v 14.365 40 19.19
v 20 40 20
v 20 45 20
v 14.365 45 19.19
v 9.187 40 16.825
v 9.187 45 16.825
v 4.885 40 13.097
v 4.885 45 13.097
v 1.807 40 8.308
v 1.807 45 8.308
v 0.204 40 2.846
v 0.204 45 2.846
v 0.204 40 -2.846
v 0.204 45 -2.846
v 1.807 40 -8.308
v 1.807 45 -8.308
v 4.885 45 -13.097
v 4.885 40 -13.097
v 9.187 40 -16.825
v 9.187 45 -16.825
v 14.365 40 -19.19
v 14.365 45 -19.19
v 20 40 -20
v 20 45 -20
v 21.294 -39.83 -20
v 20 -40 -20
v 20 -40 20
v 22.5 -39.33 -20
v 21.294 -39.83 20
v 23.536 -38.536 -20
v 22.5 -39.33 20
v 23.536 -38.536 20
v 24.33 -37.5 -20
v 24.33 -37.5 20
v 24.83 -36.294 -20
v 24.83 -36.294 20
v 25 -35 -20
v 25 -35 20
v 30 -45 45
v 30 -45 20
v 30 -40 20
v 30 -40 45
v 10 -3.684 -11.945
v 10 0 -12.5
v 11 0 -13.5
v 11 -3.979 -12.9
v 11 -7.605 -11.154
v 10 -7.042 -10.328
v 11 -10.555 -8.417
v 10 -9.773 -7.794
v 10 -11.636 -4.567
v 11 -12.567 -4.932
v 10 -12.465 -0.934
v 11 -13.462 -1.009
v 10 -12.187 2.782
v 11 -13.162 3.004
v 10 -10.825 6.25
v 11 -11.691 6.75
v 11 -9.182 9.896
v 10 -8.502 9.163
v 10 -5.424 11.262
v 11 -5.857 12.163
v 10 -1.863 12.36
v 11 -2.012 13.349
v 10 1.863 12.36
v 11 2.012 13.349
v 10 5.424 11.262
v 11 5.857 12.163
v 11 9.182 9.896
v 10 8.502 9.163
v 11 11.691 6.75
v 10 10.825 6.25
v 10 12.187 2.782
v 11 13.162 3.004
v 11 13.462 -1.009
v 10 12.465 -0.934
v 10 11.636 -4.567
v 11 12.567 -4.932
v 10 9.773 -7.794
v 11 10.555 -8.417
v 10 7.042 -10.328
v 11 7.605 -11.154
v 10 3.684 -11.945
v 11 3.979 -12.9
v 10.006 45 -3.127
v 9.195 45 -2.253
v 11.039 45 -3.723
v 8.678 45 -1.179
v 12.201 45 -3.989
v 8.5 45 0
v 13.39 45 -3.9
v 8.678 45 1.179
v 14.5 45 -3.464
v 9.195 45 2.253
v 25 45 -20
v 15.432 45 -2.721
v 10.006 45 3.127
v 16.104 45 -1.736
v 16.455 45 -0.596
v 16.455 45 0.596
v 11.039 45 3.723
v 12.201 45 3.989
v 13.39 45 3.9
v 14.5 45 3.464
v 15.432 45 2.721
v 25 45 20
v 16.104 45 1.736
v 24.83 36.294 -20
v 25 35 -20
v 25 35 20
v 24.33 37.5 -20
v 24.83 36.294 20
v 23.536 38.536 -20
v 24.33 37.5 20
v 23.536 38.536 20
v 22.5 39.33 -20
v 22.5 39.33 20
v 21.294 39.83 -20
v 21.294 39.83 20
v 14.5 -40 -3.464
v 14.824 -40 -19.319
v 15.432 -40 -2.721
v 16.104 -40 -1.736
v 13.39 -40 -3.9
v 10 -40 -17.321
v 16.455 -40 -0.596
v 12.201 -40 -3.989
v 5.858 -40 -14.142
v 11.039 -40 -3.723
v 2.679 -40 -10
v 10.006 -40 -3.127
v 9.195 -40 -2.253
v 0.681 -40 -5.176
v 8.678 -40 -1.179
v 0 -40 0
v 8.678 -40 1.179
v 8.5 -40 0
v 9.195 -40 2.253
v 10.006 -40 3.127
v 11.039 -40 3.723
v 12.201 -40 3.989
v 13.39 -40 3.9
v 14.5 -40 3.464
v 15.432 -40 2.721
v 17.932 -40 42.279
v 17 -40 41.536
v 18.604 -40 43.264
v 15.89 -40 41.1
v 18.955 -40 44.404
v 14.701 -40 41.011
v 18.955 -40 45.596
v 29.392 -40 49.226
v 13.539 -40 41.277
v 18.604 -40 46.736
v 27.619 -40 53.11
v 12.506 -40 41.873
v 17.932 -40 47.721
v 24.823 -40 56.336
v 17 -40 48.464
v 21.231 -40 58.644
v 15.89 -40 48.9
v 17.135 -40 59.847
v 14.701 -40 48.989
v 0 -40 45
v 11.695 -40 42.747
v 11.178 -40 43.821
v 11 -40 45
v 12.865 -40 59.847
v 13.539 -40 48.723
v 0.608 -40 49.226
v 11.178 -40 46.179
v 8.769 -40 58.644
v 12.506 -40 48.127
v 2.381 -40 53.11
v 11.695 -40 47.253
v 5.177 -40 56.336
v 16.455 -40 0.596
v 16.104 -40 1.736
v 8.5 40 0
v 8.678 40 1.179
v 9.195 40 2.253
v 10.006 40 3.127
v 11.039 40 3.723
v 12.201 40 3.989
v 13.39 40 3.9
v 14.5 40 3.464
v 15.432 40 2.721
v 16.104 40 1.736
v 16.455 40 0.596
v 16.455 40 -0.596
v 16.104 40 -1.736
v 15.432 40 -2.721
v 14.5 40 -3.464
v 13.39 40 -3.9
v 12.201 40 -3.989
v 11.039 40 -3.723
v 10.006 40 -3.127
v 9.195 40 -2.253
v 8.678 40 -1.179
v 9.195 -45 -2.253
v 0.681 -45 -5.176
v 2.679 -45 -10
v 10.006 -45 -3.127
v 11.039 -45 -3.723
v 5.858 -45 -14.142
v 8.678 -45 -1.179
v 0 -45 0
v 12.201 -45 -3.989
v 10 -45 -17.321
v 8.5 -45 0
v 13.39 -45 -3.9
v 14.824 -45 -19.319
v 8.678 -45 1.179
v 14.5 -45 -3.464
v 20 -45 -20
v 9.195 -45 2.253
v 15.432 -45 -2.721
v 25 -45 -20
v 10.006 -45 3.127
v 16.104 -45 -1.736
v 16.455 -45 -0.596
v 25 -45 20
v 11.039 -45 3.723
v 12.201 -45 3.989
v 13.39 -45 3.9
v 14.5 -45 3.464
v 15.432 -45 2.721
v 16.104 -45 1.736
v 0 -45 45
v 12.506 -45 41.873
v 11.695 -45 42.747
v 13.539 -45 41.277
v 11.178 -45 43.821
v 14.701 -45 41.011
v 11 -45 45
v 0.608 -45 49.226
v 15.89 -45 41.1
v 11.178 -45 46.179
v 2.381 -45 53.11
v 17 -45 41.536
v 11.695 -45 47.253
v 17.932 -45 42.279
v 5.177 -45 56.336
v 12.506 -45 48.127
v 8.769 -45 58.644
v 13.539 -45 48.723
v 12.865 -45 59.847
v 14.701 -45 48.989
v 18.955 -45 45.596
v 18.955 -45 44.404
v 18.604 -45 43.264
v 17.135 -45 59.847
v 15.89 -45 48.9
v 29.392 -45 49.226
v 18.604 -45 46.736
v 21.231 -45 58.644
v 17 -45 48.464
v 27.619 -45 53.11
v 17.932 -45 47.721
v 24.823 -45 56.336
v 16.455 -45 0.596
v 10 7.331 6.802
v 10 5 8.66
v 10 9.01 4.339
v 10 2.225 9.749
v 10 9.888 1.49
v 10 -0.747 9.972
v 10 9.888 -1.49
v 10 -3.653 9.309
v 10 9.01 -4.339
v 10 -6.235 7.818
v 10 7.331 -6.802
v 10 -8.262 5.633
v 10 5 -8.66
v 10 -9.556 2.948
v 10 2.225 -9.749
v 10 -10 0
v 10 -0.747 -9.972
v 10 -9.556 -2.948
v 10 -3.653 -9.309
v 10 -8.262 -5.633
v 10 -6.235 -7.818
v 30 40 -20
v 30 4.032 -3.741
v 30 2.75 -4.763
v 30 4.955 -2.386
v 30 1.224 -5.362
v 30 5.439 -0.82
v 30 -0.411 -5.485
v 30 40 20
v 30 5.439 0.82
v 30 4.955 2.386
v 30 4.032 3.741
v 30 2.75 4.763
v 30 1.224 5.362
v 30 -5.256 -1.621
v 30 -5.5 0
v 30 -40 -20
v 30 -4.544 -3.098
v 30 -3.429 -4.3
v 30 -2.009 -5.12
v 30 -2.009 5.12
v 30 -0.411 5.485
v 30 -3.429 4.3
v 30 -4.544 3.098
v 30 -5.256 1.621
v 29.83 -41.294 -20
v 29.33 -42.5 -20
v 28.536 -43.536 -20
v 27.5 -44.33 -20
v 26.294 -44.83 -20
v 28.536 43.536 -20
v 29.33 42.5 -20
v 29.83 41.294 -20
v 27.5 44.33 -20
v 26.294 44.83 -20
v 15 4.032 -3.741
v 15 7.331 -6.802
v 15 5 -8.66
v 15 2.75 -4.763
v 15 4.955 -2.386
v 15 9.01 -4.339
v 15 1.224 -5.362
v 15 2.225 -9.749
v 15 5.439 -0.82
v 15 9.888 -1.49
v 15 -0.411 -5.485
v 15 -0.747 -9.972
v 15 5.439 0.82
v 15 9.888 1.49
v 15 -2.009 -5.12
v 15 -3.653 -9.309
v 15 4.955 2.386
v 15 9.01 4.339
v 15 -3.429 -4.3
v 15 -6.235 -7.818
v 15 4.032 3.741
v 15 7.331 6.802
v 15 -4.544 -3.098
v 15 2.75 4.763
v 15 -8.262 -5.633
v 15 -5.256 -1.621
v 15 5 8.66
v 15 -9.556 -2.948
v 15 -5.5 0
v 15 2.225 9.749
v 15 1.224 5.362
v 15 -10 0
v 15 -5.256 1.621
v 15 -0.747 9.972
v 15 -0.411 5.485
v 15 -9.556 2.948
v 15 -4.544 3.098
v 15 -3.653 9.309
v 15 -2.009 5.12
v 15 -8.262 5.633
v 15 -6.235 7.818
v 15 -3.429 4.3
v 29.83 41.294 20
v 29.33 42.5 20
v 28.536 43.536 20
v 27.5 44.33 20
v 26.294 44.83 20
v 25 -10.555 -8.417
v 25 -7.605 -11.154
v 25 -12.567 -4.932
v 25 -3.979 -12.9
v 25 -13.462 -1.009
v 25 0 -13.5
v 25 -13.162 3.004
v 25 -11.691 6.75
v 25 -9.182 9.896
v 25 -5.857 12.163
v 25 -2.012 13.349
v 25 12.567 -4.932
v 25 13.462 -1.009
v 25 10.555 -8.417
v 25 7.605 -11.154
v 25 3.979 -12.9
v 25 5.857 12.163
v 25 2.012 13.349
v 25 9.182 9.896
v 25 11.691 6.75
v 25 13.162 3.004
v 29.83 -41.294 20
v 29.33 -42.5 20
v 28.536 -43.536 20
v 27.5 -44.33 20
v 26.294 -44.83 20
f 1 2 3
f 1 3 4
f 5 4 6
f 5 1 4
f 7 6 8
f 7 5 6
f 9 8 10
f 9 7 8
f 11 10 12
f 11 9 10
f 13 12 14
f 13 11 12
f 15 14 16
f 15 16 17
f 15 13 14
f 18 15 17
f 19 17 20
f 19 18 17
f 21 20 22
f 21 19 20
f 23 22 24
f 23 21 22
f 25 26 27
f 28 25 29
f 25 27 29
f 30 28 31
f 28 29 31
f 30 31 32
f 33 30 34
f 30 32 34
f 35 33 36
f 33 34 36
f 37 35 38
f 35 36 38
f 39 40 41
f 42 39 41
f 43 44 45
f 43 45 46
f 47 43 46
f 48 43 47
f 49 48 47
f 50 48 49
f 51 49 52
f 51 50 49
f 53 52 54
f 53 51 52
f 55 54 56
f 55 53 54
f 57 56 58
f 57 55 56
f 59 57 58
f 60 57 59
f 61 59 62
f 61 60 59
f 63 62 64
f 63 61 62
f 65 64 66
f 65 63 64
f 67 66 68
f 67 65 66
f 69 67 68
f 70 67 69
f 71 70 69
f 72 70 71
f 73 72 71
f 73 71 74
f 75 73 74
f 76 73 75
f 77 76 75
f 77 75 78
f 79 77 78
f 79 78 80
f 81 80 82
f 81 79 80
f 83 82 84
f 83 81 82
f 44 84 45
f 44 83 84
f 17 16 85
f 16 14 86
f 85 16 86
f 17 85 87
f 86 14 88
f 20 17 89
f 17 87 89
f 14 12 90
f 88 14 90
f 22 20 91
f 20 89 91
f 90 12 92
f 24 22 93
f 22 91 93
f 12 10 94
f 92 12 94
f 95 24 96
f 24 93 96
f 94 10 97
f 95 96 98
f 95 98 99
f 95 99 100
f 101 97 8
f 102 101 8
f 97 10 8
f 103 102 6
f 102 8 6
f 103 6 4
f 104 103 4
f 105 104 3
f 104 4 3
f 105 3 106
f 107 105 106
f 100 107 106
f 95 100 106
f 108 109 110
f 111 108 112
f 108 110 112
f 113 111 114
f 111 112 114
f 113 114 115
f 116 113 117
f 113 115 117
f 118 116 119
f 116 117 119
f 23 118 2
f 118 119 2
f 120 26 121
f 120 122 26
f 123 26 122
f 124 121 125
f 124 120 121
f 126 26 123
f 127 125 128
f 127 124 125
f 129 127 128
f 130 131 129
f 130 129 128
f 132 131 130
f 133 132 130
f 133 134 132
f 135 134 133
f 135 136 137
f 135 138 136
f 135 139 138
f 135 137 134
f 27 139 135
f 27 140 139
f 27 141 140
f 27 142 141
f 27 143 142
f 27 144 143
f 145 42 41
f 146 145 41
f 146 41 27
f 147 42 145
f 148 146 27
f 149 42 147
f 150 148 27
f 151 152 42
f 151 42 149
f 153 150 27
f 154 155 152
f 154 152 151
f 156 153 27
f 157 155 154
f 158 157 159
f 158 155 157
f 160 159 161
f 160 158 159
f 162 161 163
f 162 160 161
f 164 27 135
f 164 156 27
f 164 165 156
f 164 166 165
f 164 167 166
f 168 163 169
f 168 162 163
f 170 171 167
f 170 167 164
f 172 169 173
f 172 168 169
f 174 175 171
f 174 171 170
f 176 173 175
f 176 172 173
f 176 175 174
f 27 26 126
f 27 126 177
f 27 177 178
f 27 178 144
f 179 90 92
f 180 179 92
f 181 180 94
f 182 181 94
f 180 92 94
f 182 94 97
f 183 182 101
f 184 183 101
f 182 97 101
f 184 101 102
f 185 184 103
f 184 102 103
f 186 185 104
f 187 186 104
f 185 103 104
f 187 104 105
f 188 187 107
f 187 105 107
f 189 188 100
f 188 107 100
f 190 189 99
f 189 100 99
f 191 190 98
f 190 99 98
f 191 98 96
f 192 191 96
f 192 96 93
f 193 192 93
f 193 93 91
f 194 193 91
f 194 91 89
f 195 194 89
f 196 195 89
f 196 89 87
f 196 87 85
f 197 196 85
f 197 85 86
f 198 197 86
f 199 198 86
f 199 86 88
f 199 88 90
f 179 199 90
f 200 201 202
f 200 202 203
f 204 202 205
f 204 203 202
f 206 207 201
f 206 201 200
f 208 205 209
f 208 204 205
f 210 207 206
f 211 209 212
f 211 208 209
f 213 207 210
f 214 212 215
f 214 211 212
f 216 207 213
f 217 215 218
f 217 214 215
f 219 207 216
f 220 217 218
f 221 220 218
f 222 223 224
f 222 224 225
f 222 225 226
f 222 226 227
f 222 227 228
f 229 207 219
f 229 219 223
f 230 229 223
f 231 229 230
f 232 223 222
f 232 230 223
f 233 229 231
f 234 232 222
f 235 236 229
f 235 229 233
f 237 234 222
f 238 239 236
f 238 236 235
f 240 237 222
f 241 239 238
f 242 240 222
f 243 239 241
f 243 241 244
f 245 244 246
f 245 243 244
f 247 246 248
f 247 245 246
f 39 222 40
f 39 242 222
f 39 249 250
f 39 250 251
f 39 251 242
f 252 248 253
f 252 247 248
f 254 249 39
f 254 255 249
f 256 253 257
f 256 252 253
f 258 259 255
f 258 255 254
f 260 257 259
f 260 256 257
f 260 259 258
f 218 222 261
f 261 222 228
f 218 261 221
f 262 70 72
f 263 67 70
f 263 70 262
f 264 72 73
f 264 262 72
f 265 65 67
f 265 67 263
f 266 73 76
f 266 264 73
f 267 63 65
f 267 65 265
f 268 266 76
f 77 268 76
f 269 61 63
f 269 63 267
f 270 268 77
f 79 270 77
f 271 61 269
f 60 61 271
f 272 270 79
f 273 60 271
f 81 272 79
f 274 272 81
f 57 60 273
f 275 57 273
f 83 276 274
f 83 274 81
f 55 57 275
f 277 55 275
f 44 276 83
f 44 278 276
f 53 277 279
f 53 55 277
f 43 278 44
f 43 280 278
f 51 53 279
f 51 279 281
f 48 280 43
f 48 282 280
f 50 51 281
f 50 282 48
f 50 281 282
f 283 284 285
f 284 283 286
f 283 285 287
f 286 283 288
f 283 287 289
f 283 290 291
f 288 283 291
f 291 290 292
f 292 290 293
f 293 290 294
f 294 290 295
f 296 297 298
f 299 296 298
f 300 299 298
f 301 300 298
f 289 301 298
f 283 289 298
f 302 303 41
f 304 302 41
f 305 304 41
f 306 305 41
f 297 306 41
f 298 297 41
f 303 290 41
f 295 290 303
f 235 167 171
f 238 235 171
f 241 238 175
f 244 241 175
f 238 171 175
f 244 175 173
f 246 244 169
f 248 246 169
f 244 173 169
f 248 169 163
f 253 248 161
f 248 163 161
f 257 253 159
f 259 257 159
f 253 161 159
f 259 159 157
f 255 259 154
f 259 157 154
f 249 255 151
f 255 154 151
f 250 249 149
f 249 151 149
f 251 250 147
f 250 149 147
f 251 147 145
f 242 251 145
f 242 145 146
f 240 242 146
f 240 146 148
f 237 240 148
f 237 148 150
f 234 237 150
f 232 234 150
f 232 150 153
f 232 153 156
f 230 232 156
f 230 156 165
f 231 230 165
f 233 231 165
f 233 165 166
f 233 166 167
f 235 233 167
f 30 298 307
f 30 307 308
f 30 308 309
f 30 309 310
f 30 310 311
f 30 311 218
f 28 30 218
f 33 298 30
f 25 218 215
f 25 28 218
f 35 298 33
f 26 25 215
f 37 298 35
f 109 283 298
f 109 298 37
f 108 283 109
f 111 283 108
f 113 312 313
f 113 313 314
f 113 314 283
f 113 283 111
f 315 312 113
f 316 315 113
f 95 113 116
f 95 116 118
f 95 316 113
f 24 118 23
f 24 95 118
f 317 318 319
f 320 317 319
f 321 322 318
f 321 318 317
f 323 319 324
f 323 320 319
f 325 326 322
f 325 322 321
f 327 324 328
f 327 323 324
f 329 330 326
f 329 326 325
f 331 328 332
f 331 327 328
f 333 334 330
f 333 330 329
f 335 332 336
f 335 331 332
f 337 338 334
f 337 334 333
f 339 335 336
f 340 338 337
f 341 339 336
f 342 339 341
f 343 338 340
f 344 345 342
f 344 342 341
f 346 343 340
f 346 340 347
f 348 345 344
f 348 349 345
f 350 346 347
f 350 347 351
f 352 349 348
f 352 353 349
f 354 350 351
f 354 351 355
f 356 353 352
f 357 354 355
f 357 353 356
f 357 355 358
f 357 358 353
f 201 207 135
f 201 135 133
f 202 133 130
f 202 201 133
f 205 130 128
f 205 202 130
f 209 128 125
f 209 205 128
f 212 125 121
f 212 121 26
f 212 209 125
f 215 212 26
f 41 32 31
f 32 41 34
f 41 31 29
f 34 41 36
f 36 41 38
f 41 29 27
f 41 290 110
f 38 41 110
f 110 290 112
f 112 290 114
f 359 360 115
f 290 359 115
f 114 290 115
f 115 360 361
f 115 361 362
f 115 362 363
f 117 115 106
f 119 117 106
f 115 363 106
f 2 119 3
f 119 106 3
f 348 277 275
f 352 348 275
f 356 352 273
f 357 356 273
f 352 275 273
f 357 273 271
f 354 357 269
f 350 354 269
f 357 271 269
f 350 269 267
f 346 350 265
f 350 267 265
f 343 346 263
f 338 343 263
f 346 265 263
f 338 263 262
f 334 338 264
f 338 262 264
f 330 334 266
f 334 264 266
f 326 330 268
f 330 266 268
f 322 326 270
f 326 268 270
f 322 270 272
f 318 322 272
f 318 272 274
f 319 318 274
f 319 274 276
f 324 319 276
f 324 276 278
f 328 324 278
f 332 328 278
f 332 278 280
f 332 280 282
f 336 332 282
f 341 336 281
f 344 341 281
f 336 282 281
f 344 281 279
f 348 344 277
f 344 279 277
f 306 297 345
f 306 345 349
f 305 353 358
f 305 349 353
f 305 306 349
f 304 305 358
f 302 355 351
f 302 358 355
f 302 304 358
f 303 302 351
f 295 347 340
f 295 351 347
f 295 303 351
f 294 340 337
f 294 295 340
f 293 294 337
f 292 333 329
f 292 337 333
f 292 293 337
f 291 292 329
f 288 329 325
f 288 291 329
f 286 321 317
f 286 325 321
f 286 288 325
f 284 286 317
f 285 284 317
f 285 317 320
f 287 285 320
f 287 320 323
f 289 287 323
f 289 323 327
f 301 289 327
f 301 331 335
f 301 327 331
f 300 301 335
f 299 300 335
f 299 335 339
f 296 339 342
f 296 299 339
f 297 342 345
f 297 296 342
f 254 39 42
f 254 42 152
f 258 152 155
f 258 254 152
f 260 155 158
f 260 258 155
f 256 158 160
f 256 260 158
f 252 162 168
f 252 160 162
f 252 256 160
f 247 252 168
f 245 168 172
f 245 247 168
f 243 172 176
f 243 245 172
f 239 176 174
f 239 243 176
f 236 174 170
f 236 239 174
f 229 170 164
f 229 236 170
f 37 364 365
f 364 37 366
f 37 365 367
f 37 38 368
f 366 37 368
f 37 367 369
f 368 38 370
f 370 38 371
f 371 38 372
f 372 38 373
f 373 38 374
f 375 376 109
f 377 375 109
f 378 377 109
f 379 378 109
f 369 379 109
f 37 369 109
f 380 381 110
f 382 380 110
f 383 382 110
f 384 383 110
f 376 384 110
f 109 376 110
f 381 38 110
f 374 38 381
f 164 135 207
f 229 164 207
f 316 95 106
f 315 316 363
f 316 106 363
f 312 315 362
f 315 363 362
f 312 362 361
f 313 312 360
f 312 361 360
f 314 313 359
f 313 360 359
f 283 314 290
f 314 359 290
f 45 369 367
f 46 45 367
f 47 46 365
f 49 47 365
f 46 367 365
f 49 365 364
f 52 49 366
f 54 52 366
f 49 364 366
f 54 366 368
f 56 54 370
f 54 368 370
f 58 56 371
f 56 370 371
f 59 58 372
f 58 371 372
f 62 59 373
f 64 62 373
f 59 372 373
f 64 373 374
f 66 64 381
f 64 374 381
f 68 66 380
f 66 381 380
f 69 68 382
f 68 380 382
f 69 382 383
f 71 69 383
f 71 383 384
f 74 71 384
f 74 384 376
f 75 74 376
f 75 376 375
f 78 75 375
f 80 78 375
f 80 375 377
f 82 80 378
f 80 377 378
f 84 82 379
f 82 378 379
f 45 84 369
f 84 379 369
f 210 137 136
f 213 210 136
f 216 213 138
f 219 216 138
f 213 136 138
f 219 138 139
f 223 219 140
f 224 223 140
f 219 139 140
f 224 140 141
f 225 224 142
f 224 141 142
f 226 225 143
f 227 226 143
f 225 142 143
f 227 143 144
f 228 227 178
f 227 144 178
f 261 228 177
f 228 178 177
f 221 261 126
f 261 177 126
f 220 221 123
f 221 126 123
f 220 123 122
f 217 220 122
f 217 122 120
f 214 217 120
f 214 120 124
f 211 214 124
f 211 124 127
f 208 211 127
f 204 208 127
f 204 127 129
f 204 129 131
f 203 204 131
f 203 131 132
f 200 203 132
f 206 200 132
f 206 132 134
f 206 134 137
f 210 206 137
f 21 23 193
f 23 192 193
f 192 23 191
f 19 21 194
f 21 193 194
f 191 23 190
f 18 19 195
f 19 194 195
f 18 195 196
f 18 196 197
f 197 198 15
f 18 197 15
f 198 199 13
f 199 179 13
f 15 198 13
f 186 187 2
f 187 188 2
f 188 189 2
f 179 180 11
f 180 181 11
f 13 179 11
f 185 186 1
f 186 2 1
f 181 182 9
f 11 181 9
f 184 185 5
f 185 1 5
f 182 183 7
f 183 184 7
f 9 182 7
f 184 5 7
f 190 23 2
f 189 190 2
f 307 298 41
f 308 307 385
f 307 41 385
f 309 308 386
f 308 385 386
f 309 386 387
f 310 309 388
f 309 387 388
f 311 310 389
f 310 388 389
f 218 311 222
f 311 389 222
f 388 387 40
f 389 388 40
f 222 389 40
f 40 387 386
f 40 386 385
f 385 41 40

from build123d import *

# Parameters (mm, degrees)
BOSS_EXTRUDE2_DEPTH             = 20
SKETCH2_R                       = 13.5
SKETCH2_R_2                     = 5.5
BOSS_EXTRUDE3_DEPTH             = 15
CUT_EXTRUDE1_DEPTH              = 56.226805086
CUT_EXTRUDE1_DEPTH_BACK         = 56.226805086
SKETCH2_3_R                     = 5.5
CHAMFER1_SIZE                   = 1
SKETCH3_R                       = 4
CUT_EXTRUDE2_DEPTH              = 10
FILLET2_RADIUS                  = 20
FILLET2_LENGTH                  = 5
FILLET3_RADIUS                  = 20
FILLET3_LENGTH                  = 5
SKETCH4_R                       = 4
CUT_EXTRUDE3_DEPTH              = 10
BOSS_EXTRUDE4_DEPTH             = 40
BOSS_EXTRUDE4_DIRECTION_2_REACH = 69.268
SKETCH7_R                       = 4
CUT_EXTRUDE4_DEPTH              = 30
FILLET5_RADIUS                  = 15
FILLET5_LENGTH                  = 5
SKETCH8_R                       = 10
CUT_EXTRUDE5_DEPTH              = 5


with BuildPart() as part:
    # Sketch1 → Boss-Extrude2 (new, symmetric)
    with BuildSketch(Plane.XY):
        with BuildLine():
            Line((0, 45), (25, 45))
            ThreePointArc((25, 45), (28.535533906, 43.535533906), (30, 40))
            Line((30, 40), (30, -40))
            ThreePointArc((30, -40), (28.535533906, -43.535533906), (25, -45))
            Line((25, -45), (0, -45))
            Line((0, -45), (0, -40))
            Line((0, -40), (20, -40))
            ThreePointArc((20, -40), (23.535533906, -38.535533906), (25, -35))
            Line((25, -35), (25, 35))
            ThreePointArc((25, 35), (23.535533906, 38.535533906), (20, 40))
            Line((20, 40), (0, 40))
            Line((0, 40), (0, 45))
        make_face()
    extrude(amount=BOSS_EXTRUDE2_DEPTH, both=True)

    # Sketch2 → Boss-Extrude3 (add)
    # profile 1 of 2: a face of its own
    with BuildSketch(Plane.ZY.offset(-25)):
        with Locations(Location((0, 0, 0), (0, 0, 180))):
            Circle(SKETCH2_R)
        Circle(SKETCH2_R_2, mode=Mode.SUBTRACT)
    # profile 2 of 2: a face of its own
    with BuildSketch(Plane.ZY.offset(-25)):
        Circle(SKETCH2_R_2)
    extrude(amount=BOSS_EXTRUDE3_DEPTH)

    # Sketch2<3> → Cut-Extrude1 (cut, two sides: drawn at the far end of the back side and taken through both)
    with BuildSketch(Plane.ZY.offset(-25).offset(-CUT_EXTRUDE1_DEPTH_BACK)):
        with Locations(Location((0, 0, 0), (0, 0, 270))):
            Circle(SKETCH2_3_R)
    extrude(amount=CUT_EXTRUDE1_DEPTH + CUT_EXTRUDE1_DEPTH_BACK, mode=Mode.SUBTRACT)

    # Chamfer1
    chamfer1_edges = [part.edges().sort_by_distance(p)[0] for p in [
        (10, 0, 13.5),
    ]]
    chamfer(chamfer1_edges, length=CHAMFER1_SIZE)

    # Sketch3 → Cut-Extrude2 (cut)
    with BuildSketch(Plane(origin=(0, 45, 0), x_dir=(1, 0, 0), z_dir=(0, 1, 0))):
        with Locations(Location((12.5, 0, 0), (0, 0, 180))):
            Circle(SKETCH3_R)
    extrude(amount=-CUT_EXTRUDE2_DEPTH, mode=Mode.SUBTRACT)

    # Fillet2: full round fillet: the end face becomes a half cylinder, R = half its width
    fillet2_face = Plane((0, 42.5, 0), x_dir=(0, -1, 0), z_dir=(-1, 0, 0))  # on the end face: x along it, z out of the body
    fillet2_slab = fillet2_face.offset(-FILLET2_RADIUS / 2) * Box(FILLET2_LENGTH, 2 * FILLET2_RADIUS, FILLET2_RADIUS, mode=Mode.PRIVATE)  # the body's end, R deep
    fillet2_round = Plane((20, 42.5, 0), x_dir=(-1, 0, 0), z_dir=(0, -1, 0)) * Cylinder(FILLET2_RADIUS, FILLET2_LENGTH, mode=Mode.PRIVATE)  # its axis R under the face
    add(fillet2_slab - fillet2_round, mode=Mode.SUBTRACT)

    # Fillet3: full round fillet: the end face becomes a half cylinder, R = half its width
    fillet3_face = Plane((0, -42.5, 0), x_dir=(0, -1, 0), z_dir=(-1, 0, 0))  # on the end face: x along it, z out of the body
    fillet3_slab = fillet3_face.offset(-FILLET3_RADIUS / 2) * Box(FILLET3_LENGTH, 2 * FILLET3_RADIUS, FILLET3_RADIUS, mode=Mode.PRIVATE)  # the body's end, R deep
    fillet3_round = Plane((20, -42.5, 0), x_dir=(-1, 0, 0), z_dir=(0, -1, 0)) * Cylinder(FILLET3_RADIUS, FILLET3_LENGTH, mode=Mode.PRIVATE)  # its axis R under the face
    add(fillet3_slab - fillet3_round, mode=Mode.SUBTRACT)

    # Sketch4 → Cut-Extrude3 (cut)
    with BuildSketch(Plane(origin=(0, -40, 0), x_dir=(1, 0, 0), z_dir=(0, 1, 0))):
        with Locations(Location((12.5, 0, 0), (0, 0, 180))):
            Circle(SKETCH4_R)
    extrude(amount=-CUT_EXTRUDE3_DEPTH, mode=Mode.SUBTRACT)

    # Sketch6 → Boss-Extrude4 (add)
    with BuildSketch(Plane.XY.offset(20)):
        Polygon((0, -40), (0, -45), (30, -45), (30, -40), (20, -40), align=None)
    extrude(amount=BOSS_EXTRUDE4_DEPTH)

    # Sketch6 → Boss-Extrude4 direction 2 (add, up to next)
    with BuildSketch(Plane.XY.offset(20), mode=Mode.PRIVATE) as boss_extrude4_direction_2_sk1:
        Polygon((0, -40), (0, -45), (30, -45), (30, -40), (20, -40), align=None)
    boss_extrude4_direction_2_tool1 = extrude(boss_extrude4_direction_2_sk1.sketch, amount=-BOSS_EXTRUDE4_DIRECTION_2_REACH, mode=Mode.PRIVATE) - part.part
    add(boss_extrude4_direction_2_tool1.solids().sort_by_distance((15, -42.5, 20))[0])

    # Sketch7 → Cut-Extrude4 (cut)
    with BuildSketch(Plane(origin=(0, -40, 0), x_dir=(1, 0, 0), z_dir=(0, 1, 0))):
        with Locations(Location((15, -45, 0), (0, 0, 180))):
            Circle(SKETCH7_R)
    extrude(amount=-CUT_EXTRUDE4_DEPTH, mode=Mode.SUBTRACT)

    # Fillet5: full round fillet: the end face becomes a half cylinder, R = half its width
    fillet5_face = Plane((15, -42.5, 60), x_dir=(0, -1, 0), z_dir=(0, 0, 1))  # on the end face: x along it, z out of the body
    fillet5_slab = fillet5_face.offset(-FILLET5_RADIUS / 2) * Box(FILLET5_LENGTH, 2 * FILLET5_RADIUS, FILLET5_RADIUS, mode=Mode.PRIVATE)  # the body's end, R deep
    fillet5_round = Plane((15, -42.5, 45), x_dir=(0, 0, 1), z_dir=(0, -1, 0)) * Cylinder(FILLET5_RADIUS, FILLET5_LENGTH, mode=Mode.PRIVATE)  # its axis R under the face
    add(fillet5_slab - fillet5_round, mode=Mode.SUBTRACT)

    # Sketch8 → Cut-Extrude5 (cut)
    with BuildSketch(Plane.ZY.offset(-10)):
        with Locations(Location((0, 0, 0), (0, 0, 270))):
            Circle(SKETCH8_R)
    extrude(amount=-CUT_EXTRUDE5_DEPTH, mode=Mode.SUBTRACT)


solid = part.part
